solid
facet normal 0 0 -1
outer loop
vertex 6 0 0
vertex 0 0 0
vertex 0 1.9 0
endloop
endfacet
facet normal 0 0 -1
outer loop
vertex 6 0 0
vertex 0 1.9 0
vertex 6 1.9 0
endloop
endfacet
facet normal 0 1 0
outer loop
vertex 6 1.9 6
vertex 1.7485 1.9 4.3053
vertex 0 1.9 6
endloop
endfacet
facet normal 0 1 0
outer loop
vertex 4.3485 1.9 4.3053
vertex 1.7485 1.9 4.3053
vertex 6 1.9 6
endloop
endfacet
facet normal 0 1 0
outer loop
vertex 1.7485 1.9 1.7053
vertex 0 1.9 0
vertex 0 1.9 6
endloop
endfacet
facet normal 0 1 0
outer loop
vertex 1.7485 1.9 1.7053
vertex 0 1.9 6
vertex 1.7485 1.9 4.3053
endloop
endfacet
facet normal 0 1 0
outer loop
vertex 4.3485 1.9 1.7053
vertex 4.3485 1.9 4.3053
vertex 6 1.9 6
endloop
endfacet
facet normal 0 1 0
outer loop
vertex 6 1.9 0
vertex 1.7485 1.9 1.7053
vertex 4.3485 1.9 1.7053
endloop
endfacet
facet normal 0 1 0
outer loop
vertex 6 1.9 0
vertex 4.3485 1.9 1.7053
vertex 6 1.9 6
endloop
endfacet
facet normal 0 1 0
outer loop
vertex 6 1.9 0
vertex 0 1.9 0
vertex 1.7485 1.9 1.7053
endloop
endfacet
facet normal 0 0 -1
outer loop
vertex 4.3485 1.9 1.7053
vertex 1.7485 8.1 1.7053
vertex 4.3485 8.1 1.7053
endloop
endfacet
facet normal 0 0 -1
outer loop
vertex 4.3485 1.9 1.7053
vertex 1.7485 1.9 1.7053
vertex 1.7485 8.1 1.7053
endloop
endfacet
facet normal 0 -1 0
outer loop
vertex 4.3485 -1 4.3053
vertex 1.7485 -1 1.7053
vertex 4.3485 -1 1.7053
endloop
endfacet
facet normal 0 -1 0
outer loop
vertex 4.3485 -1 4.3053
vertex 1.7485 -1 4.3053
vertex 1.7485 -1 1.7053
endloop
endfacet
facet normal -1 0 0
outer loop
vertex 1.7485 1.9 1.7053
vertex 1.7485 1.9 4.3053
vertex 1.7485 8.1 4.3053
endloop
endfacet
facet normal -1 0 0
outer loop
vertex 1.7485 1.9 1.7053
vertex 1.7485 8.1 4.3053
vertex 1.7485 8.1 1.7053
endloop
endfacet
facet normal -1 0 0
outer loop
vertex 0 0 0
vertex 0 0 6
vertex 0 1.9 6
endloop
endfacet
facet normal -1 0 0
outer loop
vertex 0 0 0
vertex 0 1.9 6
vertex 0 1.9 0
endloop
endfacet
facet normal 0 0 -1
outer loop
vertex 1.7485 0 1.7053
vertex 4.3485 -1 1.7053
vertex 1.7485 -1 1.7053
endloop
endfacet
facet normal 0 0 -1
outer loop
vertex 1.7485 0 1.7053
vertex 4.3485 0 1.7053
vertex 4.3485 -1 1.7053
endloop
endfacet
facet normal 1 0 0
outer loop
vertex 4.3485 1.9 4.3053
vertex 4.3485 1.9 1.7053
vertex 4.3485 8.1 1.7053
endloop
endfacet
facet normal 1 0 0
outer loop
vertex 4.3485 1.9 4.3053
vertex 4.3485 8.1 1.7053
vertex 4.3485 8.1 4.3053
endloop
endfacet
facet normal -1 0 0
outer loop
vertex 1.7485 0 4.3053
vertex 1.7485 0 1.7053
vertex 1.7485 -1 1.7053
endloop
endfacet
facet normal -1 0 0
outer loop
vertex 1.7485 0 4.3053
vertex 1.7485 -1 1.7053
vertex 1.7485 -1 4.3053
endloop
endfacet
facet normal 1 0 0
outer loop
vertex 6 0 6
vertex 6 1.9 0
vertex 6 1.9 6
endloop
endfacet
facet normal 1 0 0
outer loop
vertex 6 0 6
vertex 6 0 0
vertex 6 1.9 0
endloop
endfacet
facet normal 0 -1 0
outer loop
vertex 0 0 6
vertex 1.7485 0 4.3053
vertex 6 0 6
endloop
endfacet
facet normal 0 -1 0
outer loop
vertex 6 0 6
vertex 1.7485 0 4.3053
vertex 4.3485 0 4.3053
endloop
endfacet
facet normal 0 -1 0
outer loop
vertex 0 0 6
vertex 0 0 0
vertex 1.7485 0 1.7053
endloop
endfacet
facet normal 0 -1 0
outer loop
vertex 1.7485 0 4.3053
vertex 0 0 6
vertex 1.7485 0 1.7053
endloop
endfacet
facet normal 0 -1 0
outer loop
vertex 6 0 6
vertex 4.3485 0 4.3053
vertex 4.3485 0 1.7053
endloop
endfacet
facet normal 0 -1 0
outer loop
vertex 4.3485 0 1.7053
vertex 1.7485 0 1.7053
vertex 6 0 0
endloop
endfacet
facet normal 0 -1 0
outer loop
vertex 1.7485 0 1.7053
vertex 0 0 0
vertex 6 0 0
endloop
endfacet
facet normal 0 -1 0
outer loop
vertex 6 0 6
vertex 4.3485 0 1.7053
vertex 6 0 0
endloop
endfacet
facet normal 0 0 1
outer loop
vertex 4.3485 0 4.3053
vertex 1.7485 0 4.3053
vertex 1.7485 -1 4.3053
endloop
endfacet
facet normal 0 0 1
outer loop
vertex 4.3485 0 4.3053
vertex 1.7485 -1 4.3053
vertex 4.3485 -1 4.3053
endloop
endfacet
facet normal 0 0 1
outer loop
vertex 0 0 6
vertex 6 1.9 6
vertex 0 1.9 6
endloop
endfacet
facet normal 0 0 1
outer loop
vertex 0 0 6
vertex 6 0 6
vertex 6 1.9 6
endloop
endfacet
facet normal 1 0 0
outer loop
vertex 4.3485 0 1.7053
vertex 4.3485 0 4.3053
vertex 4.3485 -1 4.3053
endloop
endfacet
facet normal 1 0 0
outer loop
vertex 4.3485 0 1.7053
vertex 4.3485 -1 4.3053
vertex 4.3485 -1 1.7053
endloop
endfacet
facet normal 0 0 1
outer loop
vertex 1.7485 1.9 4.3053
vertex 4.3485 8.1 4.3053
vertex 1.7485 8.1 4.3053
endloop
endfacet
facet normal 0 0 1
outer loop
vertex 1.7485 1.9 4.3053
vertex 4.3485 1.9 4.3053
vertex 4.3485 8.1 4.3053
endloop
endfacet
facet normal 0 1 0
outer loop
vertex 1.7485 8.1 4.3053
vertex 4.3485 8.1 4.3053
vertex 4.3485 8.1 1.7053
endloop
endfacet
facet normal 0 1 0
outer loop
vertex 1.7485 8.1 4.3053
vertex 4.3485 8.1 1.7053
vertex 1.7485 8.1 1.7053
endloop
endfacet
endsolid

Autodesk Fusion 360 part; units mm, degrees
sketch "Sketch1" plane through (0, 0, 0) normal (0, 1, 0) x (1, 0, 0)
  line L0 (0, 0) -> (6, 0)
  line L1 (6, 0) -> (6, -6)
  line L2 (6, -6) -> (0, -6)
  line L3 (0, -6) -> (0, 0)
  dimension "d1" = 6
  dimension "d2" = 6
extrude "Extrude1" add sketch "Sketch1" along normal blind 1.9
sketch "Sketch2" plane through (0, 1.9, 0) normal (0, 1, 0) x (-1, 0, 0)
  line L0 (0, 6) -> (-6, 6)
  line L1 (-6, 6) -> (-6, 0)
  line L2 (-6, 0) -> (0, 0)
  line L3 (0, 0) -> (0, 6)
  line L4 (-1.7485, 1.7053) -> (-4.3485, 1.7053)
  line L5 (-4.3485, 1.7053) -> (-4.3485, 4.3053)
  line L6 (-4.3485, 4.3053) -> (-1.7485, 4.3053)
  line L7 (-1.7485, 4.3053) -> (-1.7485, 1.7053)
  dimension "d5" = 2.6
  dimension "d6" = 2.6
extrude "Extrude2" add sketch "Sketch2" along normal blind 6.2 contours L4 L5 L6 L7
sketch "Sketch3" plane through (0, 0, 0) normal (0, -1, 0) x (1, 0, 0)
  line L0 (6, 6) -> (0, 6)
  line L1 (0, 6) -> (0, 0)
  line L2 (0, 0) -> (6, 0)
  line L3 (6, 0) -> (6, 6)
  line L4 (1.7485, 4.3053) -> (4.3485, 4.3053)
  line L5 (4.3485, 4.3053) -> (4.3485, 1.7053)
  line L6 (4.3485, 1.7053) -> (1.7485, 1.7053)
  line L7 (1.7485, 1.7053) -> (1.7485, 4.3053)
  point P0 (1.7485, 4.3053)
  point P1 (4.3485, 1.7053)
extrude "Extrude3" add sketch "Sketch3" along normal blind 1 contours L4 L5 L6 L7
